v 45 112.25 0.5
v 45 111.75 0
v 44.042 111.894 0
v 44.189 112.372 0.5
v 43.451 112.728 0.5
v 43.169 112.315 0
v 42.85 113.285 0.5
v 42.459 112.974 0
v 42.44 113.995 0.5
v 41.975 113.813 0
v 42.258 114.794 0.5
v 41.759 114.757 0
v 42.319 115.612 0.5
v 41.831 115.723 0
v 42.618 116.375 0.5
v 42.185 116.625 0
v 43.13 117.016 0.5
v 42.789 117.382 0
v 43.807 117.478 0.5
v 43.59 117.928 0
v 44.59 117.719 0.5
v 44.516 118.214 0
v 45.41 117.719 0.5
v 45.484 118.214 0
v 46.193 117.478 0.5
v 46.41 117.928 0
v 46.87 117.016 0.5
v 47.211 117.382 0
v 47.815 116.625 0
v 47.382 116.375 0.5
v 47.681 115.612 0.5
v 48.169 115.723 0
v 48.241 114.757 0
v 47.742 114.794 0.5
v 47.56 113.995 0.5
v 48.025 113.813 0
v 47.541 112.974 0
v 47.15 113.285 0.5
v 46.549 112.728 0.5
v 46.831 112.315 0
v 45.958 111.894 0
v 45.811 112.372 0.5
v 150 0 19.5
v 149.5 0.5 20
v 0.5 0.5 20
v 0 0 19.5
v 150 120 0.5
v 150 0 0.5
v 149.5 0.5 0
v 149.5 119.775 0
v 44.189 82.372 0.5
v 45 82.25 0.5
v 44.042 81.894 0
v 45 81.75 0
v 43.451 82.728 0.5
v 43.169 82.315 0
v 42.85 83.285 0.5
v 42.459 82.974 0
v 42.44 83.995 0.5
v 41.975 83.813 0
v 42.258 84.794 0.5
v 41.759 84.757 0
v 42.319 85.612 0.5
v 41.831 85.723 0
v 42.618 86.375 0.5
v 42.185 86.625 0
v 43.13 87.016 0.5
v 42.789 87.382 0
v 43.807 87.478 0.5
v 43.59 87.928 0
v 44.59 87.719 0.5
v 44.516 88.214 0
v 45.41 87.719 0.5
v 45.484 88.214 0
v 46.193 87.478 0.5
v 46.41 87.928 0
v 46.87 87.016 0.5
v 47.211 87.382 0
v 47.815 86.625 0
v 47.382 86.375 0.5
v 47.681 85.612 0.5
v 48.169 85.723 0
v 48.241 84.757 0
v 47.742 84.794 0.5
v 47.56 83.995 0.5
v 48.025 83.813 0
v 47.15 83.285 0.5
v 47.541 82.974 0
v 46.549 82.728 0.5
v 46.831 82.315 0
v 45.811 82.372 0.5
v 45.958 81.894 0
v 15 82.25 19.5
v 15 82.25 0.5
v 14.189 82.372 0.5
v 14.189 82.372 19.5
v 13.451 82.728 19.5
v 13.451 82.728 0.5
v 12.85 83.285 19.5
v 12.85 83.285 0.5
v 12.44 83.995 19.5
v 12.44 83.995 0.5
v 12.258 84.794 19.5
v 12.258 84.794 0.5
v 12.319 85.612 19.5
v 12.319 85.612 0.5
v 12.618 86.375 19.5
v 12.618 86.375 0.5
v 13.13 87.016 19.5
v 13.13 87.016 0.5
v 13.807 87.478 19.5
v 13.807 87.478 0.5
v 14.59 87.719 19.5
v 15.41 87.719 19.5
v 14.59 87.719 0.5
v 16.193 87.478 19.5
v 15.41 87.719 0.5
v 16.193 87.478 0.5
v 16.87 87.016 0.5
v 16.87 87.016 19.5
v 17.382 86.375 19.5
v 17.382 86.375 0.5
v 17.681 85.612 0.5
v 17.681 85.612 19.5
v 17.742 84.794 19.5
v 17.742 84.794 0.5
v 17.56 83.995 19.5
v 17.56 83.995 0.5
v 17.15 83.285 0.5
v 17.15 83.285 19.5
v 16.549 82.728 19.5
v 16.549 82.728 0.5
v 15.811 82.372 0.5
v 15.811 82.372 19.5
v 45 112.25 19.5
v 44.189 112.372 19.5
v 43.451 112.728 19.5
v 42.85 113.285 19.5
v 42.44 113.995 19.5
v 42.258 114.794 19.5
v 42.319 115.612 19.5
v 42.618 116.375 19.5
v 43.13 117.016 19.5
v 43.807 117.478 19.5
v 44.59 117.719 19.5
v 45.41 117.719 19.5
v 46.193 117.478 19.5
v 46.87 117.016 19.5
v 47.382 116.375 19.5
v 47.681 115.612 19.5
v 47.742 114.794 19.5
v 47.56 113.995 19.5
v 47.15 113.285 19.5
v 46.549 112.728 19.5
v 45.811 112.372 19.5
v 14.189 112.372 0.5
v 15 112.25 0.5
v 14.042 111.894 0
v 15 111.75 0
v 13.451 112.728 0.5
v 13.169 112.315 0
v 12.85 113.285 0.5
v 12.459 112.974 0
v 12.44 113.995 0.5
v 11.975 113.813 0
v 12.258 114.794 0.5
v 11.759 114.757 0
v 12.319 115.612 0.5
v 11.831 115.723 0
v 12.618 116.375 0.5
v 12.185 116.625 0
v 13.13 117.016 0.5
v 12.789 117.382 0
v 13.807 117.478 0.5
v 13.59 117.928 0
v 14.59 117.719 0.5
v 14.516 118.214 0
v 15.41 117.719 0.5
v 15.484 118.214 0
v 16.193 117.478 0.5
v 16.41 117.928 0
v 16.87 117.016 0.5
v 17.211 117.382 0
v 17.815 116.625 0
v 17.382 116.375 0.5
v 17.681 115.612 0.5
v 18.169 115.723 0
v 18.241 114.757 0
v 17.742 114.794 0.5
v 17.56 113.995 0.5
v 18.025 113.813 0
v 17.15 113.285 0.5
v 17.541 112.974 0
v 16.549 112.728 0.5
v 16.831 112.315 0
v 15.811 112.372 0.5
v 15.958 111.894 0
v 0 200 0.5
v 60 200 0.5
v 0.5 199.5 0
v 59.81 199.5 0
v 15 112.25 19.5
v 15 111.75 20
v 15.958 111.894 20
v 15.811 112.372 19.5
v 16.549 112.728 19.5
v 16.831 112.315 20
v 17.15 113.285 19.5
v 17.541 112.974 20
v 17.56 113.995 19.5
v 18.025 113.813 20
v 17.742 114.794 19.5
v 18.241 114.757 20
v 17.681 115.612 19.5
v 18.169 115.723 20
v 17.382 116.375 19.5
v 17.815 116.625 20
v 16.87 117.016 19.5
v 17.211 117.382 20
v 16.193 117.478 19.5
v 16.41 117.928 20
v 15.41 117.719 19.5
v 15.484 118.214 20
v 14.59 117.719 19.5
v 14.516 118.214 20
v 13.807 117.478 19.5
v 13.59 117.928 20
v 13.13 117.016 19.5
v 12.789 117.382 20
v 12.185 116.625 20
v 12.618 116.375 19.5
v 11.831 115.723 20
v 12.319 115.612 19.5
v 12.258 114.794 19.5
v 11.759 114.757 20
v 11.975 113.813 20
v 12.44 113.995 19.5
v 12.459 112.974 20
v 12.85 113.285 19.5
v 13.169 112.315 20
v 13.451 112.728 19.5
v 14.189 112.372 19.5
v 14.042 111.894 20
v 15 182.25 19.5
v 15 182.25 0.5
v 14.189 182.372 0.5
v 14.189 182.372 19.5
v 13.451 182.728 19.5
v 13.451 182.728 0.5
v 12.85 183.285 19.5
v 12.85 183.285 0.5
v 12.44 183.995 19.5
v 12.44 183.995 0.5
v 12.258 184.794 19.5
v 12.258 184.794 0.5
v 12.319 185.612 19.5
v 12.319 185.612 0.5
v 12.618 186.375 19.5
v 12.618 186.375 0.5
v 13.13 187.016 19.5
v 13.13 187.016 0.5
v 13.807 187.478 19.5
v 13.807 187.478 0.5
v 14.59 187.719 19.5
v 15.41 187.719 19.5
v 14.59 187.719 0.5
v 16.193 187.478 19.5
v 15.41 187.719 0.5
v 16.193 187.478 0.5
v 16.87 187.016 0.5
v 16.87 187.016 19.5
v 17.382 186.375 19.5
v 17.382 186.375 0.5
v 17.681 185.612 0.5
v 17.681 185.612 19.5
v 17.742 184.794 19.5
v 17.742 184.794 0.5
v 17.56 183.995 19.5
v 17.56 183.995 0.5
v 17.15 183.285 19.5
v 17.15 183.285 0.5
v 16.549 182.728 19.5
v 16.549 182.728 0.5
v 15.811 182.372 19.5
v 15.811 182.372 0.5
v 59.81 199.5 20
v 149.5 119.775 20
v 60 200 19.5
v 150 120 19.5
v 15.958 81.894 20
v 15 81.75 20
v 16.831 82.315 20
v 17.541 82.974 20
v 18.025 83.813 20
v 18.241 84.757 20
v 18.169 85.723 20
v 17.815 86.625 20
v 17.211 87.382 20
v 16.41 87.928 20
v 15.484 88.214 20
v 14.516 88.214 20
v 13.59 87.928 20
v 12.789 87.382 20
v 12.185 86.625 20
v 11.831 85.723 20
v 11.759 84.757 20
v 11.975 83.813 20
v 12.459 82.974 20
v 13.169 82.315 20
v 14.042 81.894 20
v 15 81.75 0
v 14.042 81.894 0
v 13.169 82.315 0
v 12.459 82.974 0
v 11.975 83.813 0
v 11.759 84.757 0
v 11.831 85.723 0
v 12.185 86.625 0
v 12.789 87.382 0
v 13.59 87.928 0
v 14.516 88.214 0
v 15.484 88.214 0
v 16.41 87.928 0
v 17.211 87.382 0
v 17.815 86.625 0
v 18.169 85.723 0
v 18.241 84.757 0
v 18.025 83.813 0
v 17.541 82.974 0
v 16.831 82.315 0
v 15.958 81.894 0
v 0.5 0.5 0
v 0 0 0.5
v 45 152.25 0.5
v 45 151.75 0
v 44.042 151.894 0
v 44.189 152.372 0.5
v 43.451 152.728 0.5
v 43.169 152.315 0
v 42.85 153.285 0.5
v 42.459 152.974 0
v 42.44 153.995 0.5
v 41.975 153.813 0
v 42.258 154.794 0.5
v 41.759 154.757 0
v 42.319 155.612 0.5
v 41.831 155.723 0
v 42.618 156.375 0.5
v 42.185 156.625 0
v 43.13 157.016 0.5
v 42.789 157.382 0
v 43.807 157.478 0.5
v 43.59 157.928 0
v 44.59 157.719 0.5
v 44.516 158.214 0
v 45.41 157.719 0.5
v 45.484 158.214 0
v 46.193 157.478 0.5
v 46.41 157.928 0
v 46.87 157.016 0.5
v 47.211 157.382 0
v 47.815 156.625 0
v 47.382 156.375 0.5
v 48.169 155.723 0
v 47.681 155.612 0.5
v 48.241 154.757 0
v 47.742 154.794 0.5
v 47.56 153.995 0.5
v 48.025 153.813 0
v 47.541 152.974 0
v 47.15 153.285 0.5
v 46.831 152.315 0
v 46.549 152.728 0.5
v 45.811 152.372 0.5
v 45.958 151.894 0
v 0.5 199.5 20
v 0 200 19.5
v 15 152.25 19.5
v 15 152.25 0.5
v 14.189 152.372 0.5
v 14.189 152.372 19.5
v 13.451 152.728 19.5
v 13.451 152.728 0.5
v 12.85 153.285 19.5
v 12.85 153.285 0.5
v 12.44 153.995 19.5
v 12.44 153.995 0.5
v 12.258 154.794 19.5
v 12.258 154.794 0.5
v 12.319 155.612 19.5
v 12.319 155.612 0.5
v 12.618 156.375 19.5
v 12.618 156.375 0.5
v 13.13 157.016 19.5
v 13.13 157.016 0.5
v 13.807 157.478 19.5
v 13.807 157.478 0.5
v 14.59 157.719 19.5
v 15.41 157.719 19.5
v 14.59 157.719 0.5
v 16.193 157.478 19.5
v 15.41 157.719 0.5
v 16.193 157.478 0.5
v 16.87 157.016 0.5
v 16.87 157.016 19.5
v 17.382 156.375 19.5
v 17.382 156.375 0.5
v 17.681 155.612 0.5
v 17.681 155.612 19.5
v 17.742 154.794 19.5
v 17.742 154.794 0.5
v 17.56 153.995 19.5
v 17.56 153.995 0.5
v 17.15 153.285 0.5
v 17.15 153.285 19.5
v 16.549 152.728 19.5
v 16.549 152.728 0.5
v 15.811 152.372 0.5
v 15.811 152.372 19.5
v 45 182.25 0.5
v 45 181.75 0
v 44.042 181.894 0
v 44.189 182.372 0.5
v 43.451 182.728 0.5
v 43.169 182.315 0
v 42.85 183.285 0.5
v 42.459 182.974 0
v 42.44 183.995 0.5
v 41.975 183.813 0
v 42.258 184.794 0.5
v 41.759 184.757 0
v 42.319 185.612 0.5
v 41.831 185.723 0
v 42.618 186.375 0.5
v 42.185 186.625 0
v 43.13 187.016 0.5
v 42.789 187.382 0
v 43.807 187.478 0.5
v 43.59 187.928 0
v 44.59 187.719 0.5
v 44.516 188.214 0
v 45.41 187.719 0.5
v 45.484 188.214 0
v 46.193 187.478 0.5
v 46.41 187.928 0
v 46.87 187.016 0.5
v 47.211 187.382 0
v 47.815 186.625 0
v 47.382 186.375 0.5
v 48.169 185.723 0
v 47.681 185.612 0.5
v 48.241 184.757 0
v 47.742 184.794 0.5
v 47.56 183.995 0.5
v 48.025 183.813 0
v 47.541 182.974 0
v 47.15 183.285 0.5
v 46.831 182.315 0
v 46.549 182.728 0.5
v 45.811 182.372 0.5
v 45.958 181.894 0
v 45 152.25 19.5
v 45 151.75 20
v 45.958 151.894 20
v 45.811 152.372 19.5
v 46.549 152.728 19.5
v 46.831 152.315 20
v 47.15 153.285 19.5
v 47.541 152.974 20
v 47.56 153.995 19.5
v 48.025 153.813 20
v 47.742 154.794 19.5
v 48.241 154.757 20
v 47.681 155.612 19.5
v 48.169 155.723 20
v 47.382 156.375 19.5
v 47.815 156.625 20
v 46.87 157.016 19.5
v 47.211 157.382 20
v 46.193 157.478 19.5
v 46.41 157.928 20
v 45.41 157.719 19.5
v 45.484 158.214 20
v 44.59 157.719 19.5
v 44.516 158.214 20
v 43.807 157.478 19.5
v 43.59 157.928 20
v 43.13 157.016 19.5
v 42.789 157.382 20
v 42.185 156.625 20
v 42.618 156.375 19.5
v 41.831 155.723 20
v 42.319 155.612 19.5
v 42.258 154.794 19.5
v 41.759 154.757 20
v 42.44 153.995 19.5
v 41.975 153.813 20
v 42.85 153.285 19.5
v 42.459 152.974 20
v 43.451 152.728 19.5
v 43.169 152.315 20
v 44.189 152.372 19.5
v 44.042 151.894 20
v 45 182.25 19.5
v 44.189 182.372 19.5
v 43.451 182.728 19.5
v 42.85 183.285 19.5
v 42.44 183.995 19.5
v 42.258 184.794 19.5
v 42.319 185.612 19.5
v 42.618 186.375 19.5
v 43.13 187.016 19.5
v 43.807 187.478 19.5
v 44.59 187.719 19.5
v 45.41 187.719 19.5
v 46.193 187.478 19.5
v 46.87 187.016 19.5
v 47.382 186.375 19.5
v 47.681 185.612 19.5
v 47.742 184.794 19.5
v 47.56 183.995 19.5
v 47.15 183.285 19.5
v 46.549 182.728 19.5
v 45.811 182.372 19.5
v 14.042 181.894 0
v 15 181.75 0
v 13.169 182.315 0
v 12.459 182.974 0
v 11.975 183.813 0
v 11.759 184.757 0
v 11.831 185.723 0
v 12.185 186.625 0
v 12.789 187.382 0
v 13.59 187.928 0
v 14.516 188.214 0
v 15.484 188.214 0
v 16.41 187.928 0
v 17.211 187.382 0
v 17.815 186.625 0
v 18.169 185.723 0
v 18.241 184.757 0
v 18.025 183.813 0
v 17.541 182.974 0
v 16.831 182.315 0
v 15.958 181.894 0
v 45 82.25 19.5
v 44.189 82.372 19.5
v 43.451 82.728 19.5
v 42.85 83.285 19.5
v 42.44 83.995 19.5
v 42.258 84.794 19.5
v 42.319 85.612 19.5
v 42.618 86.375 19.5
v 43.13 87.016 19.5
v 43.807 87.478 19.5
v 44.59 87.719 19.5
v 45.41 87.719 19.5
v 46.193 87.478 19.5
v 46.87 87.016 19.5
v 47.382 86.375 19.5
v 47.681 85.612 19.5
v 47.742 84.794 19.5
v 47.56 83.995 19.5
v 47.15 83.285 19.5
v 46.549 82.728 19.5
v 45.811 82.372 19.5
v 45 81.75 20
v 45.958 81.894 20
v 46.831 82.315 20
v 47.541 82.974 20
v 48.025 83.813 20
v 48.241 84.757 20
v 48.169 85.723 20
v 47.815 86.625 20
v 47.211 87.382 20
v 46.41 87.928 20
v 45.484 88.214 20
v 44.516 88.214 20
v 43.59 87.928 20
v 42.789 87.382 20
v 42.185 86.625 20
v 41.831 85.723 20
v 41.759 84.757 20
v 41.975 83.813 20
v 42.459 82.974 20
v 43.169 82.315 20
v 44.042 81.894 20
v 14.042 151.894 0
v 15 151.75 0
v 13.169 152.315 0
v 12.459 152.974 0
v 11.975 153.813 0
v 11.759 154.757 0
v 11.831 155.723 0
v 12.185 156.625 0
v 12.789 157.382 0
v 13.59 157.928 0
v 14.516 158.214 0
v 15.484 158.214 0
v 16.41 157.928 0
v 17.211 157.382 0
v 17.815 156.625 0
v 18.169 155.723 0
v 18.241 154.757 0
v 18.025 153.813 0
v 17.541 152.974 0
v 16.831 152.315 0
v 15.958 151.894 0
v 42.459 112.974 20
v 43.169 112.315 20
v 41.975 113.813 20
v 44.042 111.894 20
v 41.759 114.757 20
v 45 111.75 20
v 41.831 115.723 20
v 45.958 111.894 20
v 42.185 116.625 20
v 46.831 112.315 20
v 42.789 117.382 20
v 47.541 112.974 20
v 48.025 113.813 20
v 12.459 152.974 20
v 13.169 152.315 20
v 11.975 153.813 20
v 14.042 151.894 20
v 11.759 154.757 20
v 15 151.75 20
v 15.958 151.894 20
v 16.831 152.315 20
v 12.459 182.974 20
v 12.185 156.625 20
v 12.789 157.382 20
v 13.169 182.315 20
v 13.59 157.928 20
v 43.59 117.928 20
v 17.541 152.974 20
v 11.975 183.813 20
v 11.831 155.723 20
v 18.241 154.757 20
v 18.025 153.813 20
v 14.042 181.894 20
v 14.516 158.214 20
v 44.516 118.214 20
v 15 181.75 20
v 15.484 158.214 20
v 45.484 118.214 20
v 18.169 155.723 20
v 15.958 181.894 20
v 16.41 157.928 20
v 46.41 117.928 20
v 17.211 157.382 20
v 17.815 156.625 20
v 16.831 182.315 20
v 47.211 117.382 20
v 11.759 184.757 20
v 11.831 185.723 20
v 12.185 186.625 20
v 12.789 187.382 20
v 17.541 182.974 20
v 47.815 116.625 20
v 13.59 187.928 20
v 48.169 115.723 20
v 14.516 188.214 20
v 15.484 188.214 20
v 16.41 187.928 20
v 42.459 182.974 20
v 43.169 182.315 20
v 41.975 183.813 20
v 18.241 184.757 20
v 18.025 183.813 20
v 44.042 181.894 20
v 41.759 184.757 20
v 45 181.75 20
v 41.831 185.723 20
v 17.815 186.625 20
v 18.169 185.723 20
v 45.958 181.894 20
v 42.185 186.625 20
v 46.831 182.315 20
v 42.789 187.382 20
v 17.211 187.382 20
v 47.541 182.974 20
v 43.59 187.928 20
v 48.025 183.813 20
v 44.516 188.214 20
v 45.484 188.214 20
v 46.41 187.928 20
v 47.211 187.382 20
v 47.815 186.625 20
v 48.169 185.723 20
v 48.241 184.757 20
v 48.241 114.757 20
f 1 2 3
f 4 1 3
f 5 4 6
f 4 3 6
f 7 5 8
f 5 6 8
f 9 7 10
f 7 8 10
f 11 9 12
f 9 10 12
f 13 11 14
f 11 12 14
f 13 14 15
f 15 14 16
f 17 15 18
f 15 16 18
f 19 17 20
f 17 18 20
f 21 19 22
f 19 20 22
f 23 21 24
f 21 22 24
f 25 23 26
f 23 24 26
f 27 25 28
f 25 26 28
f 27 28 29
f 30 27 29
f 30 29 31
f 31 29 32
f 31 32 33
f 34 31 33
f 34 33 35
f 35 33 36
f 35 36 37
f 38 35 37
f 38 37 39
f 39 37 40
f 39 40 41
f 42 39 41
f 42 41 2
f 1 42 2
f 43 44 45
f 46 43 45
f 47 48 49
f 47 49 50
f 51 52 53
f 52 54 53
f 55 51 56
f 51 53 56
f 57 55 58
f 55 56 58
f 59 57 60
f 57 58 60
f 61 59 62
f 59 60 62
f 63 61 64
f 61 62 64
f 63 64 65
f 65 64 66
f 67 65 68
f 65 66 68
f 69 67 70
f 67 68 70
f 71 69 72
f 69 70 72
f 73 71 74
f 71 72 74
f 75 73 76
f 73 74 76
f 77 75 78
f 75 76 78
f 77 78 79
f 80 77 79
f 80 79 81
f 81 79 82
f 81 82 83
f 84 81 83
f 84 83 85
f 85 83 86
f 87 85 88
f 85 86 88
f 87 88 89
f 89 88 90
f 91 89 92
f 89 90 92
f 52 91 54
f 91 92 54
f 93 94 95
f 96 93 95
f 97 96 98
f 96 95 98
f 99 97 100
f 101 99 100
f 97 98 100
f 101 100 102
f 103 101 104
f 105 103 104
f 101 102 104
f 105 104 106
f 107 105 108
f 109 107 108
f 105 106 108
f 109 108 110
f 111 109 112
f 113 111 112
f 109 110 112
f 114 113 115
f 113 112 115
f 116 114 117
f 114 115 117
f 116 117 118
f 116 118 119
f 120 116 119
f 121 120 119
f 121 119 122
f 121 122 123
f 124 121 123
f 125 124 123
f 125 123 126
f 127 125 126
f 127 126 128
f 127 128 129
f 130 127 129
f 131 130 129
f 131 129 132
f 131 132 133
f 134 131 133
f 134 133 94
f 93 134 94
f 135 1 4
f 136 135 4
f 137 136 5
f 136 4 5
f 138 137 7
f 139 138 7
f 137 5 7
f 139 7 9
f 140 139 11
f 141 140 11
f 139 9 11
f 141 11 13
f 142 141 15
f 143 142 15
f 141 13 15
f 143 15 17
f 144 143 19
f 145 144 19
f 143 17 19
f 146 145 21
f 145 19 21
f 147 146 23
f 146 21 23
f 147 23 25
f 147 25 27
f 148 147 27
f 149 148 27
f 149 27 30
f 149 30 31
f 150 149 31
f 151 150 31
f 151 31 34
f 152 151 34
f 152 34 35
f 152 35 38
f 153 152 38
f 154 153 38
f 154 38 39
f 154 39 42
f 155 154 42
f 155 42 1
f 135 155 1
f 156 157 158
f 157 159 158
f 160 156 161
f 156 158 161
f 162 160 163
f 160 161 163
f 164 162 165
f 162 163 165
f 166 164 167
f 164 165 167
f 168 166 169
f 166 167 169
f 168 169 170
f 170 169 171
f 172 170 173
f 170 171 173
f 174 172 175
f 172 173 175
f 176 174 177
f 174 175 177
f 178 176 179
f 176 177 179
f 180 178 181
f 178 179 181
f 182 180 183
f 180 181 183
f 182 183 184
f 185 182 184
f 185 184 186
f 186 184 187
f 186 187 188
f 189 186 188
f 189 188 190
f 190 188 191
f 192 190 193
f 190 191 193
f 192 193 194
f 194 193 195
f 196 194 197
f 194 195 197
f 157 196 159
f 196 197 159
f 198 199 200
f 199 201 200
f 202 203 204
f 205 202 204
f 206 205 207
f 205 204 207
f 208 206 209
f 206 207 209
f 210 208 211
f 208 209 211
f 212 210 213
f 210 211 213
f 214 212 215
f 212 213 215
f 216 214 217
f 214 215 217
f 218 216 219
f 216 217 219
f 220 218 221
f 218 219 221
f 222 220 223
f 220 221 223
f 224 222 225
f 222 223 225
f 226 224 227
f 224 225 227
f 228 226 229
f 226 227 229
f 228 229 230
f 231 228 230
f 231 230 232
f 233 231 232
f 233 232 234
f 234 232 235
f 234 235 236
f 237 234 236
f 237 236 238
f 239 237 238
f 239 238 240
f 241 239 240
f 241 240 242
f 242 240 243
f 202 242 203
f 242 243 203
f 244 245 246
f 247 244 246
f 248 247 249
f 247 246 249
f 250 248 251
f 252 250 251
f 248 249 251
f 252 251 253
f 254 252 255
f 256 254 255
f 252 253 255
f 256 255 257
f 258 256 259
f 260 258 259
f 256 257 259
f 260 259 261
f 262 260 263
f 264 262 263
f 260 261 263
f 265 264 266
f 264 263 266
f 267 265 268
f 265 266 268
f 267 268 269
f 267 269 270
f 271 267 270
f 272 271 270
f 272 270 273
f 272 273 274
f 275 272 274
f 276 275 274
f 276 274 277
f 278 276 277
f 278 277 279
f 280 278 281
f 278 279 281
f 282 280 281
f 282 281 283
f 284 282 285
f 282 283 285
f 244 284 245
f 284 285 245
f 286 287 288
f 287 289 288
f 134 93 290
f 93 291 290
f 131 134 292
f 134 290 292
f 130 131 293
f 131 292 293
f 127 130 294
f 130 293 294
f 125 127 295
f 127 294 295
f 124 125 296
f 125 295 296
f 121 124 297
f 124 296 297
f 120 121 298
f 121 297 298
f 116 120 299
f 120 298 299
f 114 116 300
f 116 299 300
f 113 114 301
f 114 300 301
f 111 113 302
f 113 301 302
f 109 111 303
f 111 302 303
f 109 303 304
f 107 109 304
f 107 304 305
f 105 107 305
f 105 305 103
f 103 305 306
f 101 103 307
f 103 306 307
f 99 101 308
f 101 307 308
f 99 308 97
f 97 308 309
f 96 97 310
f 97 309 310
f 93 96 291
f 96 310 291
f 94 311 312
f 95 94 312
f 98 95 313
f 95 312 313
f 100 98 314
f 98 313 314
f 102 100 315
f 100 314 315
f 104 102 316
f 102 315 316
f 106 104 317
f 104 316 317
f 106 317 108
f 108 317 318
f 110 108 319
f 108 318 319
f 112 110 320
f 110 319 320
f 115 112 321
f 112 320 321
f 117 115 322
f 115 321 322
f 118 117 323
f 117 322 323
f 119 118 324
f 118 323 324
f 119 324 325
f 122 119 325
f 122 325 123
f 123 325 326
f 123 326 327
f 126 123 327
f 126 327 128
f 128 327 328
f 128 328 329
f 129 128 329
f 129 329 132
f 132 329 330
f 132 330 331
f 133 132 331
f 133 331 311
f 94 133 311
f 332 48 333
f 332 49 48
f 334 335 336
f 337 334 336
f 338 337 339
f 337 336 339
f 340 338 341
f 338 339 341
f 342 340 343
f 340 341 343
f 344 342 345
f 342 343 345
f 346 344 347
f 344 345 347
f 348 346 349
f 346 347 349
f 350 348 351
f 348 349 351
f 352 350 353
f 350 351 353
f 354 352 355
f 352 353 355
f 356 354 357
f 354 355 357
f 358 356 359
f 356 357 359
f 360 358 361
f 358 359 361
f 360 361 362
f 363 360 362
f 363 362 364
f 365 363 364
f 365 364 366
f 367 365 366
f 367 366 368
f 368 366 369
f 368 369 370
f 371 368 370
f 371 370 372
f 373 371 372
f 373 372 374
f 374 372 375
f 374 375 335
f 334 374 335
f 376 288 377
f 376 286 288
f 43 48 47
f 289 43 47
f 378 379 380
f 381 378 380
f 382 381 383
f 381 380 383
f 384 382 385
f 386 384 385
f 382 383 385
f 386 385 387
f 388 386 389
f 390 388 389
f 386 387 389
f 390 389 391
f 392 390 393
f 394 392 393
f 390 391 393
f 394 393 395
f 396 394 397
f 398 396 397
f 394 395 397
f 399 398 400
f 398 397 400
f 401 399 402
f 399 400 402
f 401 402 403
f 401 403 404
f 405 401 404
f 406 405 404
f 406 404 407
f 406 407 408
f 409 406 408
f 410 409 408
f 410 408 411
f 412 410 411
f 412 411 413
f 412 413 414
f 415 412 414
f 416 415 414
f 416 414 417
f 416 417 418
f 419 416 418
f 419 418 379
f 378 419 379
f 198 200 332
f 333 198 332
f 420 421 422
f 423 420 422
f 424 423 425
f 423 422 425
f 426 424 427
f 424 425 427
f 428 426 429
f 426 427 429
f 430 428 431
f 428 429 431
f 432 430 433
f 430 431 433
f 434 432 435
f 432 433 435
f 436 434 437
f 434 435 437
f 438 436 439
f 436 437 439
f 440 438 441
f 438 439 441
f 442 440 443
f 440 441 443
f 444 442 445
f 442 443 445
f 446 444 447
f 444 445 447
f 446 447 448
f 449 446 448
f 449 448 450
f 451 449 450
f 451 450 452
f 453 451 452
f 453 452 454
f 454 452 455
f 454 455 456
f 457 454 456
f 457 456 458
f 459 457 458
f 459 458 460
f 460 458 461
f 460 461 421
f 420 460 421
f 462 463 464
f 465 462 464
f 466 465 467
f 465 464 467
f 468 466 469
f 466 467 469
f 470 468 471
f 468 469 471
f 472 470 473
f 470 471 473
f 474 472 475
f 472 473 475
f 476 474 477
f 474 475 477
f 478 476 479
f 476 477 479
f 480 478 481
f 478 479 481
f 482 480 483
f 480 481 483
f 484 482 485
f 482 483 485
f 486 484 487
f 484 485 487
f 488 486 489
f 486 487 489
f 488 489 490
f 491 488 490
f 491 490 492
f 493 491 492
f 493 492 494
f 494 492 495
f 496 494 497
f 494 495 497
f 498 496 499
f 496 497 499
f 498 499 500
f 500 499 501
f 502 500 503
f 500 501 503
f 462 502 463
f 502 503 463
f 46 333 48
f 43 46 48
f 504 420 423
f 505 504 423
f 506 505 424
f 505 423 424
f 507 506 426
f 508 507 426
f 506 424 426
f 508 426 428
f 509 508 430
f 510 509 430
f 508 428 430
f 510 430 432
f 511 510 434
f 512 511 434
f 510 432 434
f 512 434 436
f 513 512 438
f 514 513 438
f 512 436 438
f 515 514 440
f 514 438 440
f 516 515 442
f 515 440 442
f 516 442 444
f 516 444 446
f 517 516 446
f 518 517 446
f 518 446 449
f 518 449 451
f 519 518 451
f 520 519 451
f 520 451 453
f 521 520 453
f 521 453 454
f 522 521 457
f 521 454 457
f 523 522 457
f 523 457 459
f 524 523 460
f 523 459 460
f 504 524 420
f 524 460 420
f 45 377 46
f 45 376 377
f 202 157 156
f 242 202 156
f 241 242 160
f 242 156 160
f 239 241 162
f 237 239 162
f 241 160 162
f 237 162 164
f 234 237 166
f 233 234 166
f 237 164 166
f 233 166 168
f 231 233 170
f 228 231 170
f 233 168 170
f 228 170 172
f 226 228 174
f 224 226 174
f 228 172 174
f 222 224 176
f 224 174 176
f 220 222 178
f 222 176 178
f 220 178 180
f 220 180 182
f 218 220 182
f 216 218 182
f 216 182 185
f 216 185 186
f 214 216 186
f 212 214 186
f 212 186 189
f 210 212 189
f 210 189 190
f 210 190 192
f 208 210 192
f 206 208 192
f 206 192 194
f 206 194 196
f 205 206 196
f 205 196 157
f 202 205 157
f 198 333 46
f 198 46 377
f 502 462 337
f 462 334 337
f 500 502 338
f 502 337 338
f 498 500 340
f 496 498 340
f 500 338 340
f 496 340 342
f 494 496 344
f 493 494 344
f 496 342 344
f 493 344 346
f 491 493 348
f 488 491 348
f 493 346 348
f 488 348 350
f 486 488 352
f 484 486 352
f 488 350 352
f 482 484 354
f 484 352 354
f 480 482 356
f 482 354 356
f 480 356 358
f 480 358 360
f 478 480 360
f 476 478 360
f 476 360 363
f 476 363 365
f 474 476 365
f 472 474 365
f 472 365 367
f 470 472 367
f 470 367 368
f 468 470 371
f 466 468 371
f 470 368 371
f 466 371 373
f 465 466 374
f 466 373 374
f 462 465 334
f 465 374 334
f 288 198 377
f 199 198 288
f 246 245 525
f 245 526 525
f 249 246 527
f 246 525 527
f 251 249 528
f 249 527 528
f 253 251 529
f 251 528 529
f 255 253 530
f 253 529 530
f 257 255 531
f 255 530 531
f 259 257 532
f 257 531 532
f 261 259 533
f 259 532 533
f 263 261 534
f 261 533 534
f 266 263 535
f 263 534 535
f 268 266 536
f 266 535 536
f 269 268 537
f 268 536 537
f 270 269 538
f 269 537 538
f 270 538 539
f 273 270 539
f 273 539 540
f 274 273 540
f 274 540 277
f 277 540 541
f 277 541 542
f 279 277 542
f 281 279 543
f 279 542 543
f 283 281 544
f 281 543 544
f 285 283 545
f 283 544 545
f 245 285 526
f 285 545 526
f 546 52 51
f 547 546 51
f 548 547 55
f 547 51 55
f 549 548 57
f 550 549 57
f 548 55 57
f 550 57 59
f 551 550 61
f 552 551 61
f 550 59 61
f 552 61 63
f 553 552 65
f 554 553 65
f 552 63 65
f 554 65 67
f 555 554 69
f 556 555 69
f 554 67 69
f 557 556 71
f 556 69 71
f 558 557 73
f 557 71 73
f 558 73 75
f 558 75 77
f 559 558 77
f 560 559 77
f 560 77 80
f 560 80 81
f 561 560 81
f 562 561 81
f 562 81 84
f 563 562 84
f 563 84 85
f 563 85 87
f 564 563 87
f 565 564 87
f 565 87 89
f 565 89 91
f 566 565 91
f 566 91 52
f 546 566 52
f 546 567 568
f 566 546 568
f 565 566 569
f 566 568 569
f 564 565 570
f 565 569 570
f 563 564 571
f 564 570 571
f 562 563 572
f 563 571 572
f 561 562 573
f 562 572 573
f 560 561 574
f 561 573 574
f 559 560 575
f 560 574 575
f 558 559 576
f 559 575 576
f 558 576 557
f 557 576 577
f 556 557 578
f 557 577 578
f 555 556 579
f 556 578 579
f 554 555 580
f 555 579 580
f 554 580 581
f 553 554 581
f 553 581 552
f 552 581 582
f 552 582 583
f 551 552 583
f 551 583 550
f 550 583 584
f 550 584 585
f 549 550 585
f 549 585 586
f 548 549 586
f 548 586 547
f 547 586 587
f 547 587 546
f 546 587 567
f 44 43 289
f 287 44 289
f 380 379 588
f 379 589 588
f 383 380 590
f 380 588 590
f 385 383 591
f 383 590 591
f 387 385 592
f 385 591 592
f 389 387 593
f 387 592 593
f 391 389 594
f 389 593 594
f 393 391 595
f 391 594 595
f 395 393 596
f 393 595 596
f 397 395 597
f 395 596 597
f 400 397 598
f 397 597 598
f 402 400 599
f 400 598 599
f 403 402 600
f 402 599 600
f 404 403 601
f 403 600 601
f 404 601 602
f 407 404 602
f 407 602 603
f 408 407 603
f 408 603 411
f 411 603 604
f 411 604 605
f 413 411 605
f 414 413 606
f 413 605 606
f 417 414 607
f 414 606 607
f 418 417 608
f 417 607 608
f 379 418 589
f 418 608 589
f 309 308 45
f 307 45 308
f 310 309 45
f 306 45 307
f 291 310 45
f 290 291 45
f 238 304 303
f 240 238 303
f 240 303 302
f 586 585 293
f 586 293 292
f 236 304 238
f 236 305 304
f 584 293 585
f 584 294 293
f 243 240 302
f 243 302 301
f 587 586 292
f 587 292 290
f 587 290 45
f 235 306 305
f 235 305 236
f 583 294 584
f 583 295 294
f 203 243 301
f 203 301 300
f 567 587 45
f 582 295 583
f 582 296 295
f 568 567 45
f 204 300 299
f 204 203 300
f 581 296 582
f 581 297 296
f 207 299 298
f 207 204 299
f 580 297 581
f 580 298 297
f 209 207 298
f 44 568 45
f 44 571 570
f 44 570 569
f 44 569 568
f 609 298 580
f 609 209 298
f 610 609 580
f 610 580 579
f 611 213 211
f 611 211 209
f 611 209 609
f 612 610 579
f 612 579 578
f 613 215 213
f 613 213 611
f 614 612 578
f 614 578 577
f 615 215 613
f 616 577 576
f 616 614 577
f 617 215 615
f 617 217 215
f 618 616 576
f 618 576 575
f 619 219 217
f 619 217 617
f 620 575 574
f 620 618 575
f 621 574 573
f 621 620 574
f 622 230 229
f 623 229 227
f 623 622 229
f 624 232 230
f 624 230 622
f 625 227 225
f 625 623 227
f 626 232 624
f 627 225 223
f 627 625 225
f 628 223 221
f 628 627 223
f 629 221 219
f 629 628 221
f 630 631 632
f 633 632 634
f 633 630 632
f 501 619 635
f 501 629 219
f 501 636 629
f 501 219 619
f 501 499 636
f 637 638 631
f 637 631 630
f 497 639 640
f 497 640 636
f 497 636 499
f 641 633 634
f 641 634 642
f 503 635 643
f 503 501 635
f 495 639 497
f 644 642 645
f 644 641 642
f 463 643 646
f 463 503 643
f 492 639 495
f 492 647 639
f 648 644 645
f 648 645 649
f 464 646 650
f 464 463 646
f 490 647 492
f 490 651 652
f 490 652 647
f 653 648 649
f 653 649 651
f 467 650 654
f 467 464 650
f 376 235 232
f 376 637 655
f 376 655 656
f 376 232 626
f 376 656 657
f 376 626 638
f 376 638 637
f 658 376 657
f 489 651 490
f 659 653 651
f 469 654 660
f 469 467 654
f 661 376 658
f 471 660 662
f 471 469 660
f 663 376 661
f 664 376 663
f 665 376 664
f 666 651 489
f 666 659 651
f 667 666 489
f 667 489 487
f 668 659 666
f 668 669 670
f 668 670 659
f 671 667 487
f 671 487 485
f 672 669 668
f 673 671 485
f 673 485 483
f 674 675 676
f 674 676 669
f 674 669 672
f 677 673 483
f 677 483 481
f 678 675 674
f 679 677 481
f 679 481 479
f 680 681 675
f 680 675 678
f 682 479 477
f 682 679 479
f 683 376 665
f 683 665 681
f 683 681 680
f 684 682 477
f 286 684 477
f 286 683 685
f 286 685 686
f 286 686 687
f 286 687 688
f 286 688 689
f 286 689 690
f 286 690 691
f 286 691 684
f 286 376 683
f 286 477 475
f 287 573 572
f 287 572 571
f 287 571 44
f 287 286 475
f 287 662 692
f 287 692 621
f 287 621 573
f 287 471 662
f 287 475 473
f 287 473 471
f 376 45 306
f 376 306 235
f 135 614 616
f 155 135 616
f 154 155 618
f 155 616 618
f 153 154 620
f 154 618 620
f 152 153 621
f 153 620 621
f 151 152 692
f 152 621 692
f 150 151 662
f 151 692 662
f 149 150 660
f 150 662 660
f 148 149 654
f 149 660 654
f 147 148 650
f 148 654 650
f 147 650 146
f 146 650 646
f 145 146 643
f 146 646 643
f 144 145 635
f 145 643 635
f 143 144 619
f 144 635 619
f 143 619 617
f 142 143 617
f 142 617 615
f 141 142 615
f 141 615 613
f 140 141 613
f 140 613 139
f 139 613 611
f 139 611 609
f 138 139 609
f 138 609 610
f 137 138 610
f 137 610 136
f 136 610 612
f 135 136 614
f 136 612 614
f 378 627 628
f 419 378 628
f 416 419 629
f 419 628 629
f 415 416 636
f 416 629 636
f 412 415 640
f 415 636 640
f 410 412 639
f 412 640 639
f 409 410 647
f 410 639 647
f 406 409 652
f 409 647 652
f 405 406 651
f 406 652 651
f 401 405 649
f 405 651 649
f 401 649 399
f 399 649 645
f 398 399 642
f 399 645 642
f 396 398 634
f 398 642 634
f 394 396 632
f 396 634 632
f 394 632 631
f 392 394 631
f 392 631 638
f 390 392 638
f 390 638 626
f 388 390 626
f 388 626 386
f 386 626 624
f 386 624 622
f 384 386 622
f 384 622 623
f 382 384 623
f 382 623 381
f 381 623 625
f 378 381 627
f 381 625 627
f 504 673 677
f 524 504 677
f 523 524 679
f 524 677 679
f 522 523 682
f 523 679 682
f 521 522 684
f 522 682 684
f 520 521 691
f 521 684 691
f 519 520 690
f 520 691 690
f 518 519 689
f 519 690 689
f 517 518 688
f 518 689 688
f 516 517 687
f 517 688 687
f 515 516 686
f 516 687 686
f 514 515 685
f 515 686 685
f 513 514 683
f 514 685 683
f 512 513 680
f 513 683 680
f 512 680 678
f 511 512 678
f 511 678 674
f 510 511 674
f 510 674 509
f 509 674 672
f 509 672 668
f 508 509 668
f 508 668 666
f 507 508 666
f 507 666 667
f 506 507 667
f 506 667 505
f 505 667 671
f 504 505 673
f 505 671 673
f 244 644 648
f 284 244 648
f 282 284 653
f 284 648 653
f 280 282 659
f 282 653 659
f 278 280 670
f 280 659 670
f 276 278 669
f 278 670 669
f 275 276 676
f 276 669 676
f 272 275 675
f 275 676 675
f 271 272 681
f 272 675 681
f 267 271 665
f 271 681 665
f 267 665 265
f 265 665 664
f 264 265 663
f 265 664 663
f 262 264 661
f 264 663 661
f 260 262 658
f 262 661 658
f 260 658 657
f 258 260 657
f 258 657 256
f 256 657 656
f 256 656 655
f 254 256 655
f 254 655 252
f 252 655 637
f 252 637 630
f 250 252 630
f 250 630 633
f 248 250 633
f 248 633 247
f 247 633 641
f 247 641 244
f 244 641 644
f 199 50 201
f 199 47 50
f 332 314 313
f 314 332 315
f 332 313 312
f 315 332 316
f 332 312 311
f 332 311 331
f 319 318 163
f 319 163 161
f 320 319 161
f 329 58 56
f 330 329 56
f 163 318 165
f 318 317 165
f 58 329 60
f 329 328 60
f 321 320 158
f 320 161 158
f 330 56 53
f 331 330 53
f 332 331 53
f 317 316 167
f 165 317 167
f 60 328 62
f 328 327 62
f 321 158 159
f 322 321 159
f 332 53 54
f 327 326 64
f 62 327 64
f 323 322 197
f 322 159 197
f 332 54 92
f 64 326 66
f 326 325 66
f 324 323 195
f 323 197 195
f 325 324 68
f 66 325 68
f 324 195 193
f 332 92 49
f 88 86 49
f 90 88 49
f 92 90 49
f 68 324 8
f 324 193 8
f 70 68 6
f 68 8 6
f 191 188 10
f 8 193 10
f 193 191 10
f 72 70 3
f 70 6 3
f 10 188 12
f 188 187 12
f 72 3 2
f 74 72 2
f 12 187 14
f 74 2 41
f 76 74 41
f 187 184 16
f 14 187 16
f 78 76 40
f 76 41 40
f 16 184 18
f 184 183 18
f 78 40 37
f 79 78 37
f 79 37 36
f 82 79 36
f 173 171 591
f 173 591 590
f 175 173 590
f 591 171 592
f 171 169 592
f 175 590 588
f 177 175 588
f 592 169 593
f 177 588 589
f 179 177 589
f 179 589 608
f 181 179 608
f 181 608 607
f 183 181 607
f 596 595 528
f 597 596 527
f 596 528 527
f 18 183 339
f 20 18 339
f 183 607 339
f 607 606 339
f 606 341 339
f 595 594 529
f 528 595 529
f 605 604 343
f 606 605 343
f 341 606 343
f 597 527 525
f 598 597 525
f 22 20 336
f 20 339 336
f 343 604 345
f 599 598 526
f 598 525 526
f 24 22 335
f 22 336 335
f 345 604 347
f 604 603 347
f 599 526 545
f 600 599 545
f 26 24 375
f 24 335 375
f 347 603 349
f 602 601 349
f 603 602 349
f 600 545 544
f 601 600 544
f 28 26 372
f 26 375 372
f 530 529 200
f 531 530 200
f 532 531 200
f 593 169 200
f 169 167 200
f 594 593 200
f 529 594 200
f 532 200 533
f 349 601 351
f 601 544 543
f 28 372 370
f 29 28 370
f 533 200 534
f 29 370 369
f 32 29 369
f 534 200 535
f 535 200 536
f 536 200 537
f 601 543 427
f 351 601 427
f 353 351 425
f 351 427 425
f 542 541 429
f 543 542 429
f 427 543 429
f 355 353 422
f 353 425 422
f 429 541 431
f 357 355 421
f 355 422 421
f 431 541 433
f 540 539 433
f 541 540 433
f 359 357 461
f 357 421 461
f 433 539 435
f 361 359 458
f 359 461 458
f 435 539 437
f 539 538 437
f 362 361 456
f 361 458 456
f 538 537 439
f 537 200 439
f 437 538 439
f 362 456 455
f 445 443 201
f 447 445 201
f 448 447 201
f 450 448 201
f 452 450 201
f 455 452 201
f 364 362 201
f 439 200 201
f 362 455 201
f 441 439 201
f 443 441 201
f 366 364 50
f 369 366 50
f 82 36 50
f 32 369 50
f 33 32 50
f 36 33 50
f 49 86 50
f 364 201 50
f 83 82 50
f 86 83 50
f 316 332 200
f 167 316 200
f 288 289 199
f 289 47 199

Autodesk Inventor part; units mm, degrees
ref_plane "YZ Plane" through (0, 0, 0) normal (1, 0, 0) x (0, 1, 0)
ref_plane "XZ Plane" through (0, 0, 0) normal (0, 1, 0) x (-1, 0, 0)
ref_plane "XY Plane" through (0, 0, 0) normal (0, 0, 1) x (1, 0, 0)
sketch "Skizze1" plane through (0, 0, 0) normal (0, 0, 1) x (1, 0, 0)
  line L0 (0, 0) -> (0, 200)
  line L1 (0, 200) -> (60, 200)
  line L2 (0, 0) -> (150, 0)
  line L3 (150, 0) -> (150, 120)
  line L4 (150, 120) -> (60, 200)
  dimension "d0" = 200
  dimension "d1" = 60
  dimension "d2" = 150
  dimension "d3" = 120
extrude "Extrusion1" add sketch "Skizze1" along normal blind 20
sketch "Skizze2" plane through (0, 0, 20) normal (0, 0, 1) x (1, 0, 0)
  line L0 (60, 200) -> (0, 200) projected
  line L1 (30, 200) -> (30, 170) construction
  line L2 (30, 170) -> (30, 100) construction
  line L3 (15, 155) -> (45, 155) construction
  line L4 (45, 155) -> (45, 185) construction
  line L5 (45, 185) -> (15, 185) construction
  line L6 (15, 185) -> (15, 155) construction
  line L7 (15, 155) -> (45, 185) construction
  line L8 (45, 155) -> (15, 185) construction
  line L9 (15, 85) -> (45, 85) construction
  line L10 (45, 85) -> (45, 115) construction
  line L11 (45, 115) -> (15, 115) construction
  line L12 (15, 115) -> (15, 85) construction
  line L13 (15, 85) -> (45, 115) construction
  line L14 (45, 85) -> (15, 115) construction
  point P0 (0, 0)
  dimension "d6" = 30
  dimension "d7" = 70
  dimension "d8" = 30
  dimension "d9" = 30
  dimension "d10" = 30
  dimension "d11" = 30
hole "Bohrung1" at (15, 185, 20) at (45, 185, 20) at (15, 155, 20) at (45, 155, 20) at (15, 115, 20) at (45, 115, 20) at (15, 85, 20) at (45, 85, 20) direction (0, 0, -1) diameter 5.5 end through all clearance for "Sechskantkopfschraube ISO 24017" size "M5" standard "ISO"
chamfer "Fase1" distance 0.5 angle 45 18 edges at (30, 200, 20) (105, 160, 20) (150, 60, 20) (75, 0, 20) (0, 100, 20) (15, 87.75, 20) (15, 117.75, 20) (45, 87.75, 20) (45, 117.75, 20) (15, 157.75, 20) (15, 187.75, 20) (45, 157.75, 20) (45, 187.75, 20) (105, 160, 0) (30, 200, 0) (0, 100, 0) (150, 60, 0) (75, 0, 0)
chamfer "Fase2" distance 0.5 angle 45 8 edges at (15, 87.75, 0) (15, 117.75, 0) (45, 87.75, 0) (45, 117.75, 0) (15, 157.75, 0) (15, 187.75, 0) (45, 157.75, 0) (45, 187.75, 0)
properties part number "Portalwange" material "Aluminium 6061"
